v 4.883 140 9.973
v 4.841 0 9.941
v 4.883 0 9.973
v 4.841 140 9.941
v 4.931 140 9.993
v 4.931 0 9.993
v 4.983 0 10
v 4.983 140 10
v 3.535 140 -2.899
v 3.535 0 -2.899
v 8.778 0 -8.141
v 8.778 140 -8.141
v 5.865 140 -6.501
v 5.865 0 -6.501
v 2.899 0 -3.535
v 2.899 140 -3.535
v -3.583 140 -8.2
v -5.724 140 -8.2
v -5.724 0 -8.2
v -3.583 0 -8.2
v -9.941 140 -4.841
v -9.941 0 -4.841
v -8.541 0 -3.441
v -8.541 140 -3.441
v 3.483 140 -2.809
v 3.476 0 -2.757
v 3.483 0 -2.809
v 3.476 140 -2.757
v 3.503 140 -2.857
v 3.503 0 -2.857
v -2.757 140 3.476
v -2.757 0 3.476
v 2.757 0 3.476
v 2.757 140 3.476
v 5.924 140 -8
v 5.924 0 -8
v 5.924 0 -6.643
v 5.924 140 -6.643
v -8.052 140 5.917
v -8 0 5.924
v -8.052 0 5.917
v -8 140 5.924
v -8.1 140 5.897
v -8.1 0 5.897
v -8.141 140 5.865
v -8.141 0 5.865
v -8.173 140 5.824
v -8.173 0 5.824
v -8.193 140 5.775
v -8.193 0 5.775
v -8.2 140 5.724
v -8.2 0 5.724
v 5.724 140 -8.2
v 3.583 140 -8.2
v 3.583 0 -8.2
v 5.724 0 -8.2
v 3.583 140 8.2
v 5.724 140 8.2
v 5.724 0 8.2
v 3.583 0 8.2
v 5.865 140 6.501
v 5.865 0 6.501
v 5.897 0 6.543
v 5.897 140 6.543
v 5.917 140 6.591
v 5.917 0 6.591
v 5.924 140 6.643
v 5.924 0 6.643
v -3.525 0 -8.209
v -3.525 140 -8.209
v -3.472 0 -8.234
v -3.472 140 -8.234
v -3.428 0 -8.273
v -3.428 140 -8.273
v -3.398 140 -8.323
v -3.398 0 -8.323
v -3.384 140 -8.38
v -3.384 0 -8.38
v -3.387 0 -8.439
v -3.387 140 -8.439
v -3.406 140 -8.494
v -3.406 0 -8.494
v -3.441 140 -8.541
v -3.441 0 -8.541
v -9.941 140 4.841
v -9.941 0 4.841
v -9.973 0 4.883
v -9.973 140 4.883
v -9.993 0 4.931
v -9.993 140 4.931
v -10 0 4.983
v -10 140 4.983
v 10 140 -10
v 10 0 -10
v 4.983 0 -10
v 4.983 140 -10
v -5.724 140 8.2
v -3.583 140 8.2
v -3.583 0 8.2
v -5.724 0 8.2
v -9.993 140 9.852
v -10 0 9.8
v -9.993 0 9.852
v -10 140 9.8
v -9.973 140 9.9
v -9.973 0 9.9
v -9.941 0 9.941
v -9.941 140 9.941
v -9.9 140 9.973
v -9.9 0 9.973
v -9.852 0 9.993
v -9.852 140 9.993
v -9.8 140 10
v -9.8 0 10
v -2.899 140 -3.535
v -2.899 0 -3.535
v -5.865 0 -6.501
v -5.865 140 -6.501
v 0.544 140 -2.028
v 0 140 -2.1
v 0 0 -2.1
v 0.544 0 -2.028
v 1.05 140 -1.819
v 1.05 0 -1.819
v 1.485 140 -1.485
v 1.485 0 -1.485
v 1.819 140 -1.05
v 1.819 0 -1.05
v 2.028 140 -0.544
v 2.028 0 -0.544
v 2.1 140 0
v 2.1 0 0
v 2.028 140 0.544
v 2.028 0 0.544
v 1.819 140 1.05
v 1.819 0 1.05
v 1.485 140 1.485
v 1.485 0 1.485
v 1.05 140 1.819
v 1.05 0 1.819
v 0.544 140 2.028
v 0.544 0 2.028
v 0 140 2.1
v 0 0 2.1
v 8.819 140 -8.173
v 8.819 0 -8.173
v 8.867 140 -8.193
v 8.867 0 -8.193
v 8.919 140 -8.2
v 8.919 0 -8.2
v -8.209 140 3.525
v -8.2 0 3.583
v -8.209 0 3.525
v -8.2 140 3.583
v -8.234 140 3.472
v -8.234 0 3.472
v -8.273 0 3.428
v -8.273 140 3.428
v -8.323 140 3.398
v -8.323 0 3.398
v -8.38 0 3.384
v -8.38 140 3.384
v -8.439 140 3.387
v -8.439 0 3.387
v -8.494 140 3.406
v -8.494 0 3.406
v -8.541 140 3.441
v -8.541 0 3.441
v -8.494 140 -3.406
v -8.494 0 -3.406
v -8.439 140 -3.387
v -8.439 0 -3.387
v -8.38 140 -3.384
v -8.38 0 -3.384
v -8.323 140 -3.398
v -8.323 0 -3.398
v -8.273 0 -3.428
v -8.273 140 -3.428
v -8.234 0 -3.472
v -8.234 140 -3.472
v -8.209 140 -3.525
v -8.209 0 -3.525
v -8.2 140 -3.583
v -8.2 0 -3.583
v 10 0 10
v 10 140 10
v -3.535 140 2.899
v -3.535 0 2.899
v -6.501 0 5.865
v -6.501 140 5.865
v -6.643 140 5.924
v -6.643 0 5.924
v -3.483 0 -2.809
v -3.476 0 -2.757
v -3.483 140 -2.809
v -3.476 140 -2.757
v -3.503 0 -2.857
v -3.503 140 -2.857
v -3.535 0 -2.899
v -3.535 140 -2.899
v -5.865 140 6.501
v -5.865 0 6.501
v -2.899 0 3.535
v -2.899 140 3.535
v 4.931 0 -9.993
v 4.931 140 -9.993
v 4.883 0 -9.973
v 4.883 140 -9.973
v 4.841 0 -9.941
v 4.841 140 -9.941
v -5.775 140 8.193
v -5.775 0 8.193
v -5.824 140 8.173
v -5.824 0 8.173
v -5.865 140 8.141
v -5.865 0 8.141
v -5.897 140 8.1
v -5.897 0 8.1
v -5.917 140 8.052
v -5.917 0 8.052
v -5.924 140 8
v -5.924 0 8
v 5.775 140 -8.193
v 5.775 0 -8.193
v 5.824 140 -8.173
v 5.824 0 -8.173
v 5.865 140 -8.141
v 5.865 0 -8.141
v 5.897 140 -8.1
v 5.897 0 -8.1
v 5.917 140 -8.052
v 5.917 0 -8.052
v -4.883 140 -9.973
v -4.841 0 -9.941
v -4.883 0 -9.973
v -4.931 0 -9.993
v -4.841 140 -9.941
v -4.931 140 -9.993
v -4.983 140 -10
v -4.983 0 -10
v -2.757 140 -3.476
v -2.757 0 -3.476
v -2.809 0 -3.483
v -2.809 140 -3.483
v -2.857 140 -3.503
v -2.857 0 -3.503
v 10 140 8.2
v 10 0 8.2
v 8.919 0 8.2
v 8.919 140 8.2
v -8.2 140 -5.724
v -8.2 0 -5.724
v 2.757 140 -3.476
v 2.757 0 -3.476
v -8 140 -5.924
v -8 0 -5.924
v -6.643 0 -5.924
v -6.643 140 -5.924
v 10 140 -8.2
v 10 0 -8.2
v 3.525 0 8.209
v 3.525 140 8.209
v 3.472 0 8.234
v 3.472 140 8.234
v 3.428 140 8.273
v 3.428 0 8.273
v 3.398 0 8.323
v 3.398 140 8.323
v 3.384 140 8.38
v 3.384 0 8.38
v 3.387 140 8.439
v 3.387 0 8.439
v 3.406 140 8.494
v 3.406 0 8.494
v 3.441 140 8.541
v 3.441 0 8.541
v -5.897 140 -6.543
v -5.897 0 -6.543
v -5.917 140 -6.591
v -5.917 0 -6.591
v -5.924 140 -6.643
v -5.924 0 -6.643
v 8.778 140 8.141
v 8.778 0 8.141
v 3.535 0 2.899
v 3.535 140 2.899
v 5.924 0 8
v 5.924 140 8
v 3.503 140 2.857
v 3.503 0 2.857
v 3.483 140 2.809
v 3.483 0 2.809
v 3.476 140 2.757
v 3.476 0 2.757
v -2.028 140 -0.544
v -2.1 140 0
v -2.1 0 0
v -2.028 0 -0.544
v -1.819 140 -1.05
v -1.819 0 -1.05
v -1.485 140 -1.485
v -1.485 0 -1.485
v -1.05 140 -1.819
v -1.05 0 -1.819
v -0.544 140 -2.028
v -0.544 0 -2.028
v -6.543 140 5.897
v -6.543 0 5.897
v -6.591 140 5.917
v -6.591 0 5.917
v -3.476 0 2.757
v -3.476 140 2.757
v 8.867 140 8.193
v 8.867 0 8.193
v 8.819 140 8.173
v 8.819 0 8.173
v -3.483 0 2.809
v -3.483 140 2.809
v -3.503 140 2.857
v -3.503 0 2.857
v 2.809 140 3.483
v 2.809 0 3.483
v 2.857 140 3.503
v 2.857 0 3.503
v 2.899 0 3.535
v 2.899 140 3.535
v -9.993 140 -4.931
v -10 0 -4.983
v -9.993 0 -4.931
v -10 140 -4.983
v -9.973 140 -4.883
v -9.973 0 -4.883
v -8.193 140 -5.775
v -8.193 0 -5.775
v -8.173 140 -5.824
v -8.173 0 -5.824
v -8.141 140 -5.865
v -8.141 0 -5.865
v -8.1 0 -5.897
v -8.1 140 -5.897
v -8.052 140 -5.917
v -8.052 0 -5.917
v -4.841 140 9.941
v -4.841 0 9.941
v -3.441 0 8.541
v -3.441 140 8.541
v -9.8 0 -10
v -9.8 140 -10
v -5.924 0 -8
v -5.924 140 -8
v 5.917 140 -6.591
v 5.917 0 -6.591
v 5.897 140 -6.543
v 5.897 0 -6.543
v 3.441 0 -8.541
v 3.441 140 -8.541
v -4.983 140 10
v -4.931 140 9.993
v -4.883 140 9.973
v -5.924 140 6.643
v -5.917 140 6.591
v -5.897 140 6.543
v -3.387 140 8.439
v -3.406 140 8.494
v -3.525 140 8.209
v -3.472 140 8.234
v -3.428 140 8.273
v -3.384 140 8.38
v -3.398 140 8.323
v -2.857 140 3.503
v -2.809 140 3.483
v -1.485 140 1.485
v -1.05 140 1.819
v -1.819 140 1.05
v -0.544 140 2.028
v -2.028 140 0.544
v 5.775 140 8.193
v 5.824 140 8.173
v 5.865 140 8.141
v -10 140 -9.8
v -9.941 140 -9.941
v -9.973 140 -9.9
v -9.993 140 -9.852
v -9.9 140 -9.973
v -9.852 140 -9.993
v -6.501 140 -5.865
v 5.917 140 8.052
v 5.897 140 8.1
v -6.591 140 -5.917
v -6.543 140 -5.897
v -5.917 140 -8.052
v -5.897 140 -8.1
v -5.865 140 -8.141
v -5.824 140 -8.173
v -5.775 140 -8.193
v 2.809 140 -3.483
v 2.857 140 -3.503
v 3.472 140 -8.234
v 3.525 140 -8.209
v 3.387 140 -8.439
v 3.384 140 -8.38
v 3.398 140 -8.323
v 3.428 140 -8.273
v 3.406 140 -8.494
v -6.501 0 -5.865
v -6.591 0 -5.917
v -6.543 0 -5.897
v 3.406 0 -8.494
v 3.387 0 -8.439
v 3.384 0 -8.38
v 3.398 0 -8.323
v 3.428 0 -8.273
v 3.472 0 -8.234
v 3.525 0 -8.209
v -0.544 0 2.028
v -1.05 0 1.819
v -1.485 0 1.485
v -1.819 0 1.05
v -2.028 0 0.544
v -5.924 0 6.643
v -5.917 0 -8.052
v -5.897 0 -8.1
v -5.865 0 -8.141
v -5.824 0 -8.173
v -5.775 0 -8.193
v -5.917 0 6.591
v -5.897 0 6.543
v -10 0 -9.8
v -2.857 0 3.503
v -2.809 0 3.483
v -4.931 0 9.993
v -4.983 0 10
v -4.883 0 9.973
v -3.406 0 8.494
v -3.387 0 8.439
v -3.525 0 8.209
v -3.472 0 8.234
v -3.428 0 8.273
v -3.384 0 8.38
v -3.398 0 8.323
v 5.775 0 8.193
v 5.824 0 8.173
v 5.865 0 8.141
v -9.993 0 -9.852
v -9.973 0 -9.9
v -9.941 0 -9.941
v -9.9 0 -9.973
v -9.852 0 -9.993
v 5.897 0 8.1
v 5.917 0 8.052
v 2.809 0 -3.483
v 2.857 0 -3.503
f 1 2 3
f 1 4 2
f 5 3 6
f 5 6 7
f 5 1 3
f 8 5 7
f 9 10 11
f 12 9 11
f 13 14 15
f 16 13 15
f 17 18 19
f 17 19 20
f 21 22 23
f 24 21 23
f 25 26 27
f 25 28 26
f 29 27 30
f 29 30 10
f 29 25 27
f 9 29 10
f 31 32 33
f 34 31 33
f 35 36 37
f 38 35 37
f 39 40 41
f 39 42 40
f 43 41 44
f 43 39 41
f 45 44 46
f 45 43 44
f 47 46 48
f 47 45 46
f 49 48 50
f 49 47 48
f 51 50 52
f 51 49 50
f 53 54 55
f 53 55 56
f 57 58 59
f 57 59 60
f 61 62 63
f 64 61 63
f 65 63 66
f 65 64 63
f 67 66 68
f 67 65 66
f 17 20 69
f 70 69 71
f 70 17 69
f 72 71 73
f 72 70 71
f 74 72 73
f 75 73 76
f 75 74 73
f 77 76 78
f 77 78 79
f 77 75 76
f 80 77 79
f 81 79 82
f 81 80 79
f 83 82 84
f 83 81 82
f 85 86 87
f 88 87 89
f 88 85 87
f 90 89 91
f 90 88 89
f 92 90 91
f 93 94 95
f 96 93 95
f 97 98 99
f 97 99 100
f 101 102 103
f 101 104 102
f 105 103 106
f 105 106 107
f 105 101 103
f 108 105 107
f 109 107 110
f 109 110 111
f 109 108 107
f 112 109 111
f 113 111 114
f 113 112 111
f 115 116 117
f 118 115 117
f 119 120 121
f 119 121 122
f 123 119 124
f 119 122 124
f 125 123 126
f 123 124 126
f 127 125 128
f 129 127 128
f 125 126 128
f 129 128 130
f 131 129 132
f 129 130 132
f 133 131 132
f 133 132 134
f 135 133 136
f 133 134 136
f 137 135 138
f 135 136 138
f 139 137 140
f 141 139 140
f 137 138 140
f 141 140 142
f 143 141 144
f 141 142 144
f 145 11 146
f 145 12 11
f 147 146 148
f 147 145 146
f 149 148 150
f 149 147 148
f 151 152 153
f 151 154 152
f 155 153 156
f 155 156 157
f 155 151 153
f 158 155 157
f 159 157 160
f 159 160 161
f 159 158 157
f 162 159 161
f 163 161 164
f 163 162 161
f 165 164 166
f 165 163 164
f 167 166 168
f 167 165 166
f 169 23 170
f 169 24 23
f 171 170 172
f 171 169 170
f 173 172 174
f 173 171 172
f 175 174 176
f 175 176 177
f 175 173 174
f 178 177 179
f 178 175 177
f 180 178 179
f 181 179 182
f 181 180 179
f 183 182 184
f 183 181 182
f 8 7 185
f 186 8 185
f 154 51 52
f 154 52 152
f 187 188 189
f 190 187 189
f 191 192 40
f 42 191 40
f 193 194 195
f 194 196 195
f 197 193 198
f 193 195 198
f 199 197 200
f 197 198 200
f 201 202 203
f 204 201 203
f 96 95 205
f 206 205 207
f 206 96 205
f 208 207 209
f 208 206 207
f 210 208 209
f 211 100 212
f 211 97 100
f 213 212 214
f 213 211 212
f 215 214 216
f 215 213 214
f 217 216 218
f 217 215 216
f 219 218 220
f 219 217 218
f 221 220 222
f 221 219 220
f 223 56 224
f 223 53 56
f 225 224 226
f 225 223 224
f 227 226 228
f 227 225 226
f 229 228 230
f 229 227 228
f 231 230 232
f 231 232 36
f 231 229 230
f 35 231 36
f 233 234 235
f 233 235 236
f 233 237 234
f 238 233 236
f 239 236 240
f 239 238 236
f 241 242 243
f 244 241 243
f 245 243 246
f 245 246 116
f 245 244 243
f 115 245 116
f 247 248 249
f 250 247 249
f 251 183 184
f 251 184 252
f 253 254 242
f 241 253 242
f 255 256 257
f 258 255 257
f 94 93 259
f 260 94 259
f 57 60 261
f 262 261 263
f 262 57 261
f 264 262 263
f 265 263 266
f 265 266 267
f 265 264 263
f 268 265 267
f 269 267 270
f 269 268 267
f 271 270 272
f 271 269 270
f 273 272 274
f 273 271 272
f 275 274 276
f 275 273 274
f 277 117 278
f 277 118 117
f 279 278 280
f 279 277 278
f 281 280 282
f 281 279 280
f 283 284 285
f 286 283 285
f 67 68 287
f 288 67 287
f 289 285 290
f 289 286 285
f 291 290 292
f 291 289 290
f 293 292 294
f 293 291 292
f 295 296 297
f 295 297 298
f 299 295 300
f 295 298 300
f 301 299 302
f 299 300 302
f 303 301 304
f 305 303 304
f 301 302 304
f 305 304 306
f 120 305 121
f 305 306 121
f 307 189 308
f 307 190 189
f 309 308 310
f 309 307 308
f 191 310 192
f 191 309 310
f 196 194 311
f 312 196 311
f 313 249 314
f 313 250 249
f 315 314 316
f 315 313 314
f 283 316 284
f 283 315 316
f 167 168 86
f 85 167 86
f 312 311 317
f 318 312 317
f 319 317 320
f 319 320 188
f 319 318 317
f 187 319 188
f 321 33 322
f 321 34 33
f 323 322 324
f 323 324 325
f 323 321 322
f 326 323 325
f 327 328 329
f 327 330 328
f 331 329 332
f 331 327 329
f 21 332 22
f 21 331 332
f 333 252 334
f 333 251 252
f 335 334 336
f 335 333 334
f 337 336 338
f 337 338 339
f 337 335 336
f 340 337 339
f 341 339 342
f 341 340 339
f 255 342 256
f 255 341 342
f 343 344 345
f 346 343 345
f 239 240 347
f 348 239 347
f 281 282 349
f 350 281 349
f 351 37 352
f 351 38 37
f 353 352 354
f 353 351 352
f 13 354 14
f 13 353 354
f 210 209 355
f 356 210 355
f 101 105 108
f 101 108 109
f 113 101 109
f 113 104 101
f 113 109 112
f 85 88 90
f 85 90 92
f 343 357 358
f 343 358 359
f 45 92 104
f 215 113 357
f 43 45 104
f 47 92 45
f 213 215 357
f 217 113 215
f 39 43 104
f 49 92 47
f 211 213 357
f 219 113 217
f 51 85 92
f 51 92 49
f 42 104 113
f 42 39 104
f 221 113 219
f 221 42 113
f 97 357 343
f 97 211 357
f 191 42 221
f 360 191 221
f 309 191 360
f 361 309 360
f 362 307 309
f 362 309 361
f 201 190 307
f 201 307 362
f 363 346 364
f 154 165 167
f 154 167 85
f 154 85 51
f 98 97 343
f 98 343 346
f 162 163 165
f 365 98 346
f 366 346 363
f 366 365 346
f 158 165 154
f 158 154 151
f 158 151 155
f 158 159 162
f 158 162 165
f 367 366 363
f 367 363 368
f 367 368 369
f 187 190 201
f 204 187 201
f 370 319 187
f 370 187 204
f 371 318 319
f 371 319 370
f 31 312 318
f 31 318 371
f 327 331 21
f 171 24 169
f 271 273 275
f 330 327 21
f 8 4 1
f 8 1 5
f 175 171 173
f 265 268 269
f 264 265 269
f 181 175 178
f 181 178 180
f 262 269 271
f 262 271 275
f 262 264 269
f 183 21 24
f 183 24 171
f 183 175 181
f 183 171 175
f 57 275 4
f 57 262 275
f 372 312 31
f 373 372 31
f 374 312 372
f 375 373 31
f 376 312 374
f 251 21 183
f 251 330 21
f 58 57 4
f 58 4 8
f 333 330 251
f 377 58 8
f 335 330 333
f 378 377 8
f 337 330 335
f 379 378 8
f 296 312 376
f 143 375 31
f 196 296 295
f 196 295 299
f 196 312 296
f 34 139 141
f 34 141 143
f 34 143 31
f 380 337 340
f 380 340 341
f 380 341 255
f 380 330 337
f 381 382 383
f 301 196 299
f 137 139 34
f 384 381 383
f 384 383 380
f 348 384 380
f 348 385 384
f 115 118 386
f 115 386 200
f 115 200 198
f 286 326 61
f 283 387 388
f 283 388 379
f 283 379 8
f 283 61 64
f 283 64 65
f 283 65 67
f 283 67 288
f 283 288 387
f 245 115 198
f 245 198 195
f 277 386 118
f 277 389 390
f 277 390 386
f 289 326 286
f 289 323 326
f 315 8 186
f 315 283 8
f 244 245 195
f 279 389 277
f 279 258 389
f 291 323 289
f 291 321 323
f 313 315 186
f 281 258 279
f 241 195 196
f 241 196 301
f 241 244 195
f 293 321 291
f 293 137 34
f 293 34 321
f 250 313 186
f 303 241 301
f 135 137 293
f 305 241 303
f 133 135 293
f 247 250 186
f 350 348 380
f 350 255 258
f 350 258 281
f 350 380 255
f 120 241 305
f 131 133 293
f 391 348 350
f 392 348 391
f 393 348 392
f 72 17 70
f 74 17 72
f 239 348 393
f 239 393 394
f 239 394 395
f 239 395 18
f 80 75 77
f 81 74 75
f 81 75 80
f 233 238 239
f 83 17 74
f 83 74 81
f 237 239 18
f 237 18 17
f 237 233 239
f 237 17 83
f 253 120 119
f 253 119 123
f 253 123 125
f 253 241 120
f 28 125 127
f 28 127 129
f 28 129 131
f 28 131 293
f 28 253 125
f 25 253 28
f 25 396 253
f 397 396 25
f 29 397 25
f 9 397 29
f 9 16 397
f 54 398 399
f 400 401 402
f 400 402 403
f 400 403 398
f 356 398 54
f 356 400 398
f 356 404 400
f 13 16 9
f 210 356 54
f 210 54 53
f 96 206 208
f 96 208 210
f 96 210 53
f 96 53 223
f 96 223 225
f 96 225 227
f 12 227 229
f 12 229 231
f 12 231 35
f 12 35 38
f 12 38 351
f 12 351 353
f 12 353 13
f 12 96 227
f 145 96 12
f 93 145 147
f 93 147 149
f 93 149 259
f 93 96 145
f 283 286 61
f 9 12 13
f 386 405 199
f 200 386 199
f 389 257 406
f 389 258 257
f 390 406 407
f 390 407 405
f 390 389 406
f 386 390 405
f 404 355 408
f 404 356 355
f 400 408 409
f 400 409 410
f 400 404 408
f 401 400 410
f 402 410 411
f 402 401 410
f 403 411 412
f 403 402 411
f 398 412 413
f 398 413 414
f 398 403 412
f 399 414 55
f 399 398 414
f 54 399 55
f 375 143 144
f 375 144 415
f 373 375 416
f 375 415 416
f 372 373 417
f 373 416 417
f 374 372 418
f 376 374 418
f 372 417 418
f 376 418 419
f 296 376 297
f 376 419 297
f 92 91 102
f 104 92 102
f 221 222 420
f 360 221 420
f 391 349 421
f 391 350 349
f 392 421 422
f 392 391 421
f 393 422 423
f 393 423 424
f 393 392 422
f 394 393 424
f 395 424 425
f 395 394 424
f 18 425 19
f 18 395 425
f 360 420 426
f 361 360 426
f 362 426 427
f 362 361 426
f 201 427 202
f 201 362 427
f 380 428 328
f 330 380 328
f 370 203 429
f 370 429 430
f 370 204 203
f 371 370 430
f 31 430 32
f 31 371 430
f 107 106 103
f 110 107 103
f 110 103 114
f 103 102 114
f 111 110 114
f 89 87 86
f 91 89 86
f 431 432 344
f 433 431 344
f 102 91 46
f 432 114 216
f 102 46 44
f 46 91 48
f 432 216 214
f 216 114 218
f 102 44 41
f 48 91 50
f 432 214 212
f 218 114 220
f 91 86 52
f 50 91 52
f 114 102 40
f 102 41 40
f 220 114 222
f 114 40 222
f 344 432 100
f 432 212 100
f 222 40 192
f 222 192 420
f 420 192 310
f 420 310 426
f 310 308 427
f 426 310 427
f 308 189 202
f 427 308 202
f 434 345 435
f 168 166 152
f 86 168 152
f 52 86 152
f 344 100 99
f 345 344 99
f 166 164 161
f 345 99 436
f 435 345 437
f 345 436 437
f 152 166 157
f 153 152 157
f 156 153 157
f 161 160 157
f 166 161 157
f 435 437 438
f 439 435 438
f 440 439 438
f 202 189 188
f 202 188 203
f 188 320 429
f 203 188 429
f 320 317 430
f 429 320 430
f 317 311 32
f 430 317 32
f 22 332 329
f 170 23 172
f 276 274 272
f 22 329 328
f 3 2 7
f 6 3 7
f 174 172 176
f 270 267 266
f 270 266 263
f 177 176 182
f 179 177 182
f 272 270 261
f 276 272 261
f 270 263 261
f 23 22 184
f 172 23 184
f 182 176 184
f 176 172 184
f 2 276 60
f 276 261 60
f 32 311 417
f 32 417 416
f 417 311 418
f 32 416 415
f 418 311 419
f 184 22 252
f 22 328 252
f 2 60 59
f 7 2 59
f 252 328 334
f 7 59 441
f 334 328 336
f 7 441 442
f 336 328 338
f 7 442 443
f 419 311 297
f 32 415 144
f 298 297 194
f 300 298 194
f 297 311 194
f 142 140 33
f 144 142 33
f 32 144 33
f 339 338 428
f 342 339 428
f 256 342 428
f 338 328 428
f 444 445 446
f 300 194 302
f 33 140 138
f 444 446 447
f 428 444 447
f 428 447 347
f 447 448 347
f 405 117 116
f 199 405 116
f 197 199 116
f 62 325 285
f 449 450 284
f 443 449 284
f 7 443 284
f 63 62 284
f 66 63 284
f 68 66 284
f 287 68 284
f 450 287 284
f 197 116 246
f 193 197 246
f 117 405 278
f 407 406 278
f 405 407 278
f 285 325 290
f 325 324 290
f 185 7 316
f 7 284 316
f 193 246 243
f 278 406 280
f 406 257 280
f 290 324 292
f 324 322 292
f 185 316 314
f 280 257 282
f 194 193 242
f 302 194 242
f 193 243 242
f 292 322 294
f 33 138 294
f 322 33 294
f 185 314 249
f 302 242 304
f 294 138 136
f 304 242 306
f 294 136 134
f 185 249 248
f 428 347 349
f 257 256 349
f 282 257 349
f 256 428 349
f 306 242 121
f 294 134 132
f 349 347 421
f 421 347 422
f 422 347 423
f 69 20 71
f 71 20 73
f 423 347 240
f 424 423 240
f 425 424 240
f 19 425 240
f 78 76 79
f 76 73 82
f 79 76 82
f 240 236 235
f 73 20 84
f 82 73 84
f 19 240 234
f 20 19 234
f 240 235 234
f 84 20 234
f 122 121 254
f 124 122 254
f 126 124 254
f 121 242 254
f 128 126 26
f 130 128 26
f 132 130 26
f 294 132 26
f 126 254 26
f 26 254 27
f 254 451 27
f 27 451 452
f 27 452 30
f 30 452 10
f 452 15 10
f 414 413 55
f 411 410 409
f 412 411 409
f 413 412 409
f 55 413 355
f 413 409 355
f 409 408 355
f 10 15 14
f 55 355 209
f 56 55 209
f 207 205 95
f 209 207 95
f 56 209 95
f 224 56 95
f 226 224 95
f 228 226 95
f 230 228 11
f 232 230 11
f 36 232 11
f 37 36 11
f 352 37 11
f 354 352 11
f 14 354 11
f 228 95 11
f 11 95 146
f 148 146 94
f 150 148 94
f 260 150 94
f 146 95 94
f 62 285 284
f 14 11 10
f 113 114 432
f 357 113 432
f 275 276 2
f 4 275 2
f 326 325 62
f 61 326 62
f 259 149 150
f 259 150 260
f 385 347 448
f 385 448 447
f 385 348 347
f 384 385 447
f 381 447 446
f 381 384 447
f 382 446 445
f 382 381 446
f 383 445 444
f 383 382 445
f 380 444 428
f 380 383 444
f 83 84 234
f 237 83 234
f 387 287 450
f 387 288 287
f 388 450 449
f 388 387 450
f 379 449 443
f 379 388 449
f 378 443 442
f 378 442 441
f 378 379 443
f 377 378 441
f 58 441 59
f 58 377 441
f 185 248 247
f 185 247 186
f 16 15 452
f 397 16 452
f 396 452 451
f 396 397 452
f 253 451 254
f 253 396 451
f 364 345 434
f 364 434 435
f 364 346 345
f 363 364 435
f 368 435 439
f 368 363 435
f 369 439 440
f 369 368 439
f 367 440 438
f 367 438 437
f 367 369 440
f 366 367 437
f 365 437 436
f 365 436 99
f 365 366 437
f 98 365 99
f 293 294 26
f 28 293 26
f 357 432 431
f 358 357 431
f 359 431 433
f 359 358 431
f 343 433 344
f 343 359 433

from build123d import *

# Parameters (mm, degrees)
EXTRUDE_1_DEPTH          = 140
FILLET_1_R               = 0.2
CUT_EXTRUDE_1_DEPTH      = 149.996644258
CUT_EXTRUDE_1_DEPTH_BACK = 149.996644258
SKETCH_2_W               = 41.416635457
SKETCH_2_H               = 21.85529521


with BuildPart() as part:
    # 草图1 → 凸台-拉伸1 (new body)
    with BuildSketch(Plane(origin=(0, 0, 0), x_dir=(1, 0, 0), z_dir=(0, 1, 0))):
        with BuildLine():
            Line((-3.476396103, 2.84), (-3.476396103, 0))
            Line((-3.476396103, 0), (-2.1, 0))
            ThreePointArc((-2.1, 0), (-1.48492424, 1.48492424), (0, 2.1))
            Line((0, 2.1), (0, 3.476396103))
            Line((0, 3.476396103), (-2.84, 3.476396103))
            Line((-2.84, 3.476396103), (-5.923603897, 6.56))
            Line((-5.923603897, 6.56), (-5.923603897, 8.2))
            Line((-5.923603897, 8.2), (-3.1, 8.2))
            Line((-3.1, 8.2), (-4.9, 10))
            Line((-4.9, 10), (-10, 10))
            Line((-10, 10), (-10, 4.9))
            Line((-10, 4.9), (-8.2, 3.1))
            Line((-8.2, 3.1), (-8.2, 5.923603897))
            Line((-8.2, 5.923603897), (-6.56, 5.923603897))
            Line((-6.56, 5.923603897), (-3.476396103, 2.84))
        make_face()
        with BuildLine():
            Line((-2.1, 0), (-3.476396103, 0))
            Line((-3.476396103, 0), (-3.476396103, -2.84))
            Line((-3.476396103, -2.84), (-6.56, -5.923603897))
            Line((-6.56, -5.923603897), (-8.2, -5.923603897))
            Line((-8.2, -5.923603897), (-8.2, -3.1))
            Line((-8.2, -3.1), (-10, -4.9))
            Line((-10, -4.9), (-10, -10))
            Line((-10, -10), (-4.9, -10))
            Line((-4.9, -10), (-3.1, -8.2))
            Line((-3.1, -8.2), (-5.923603897, -8.2))
            Line((-5.923603897, -8.2), (-5.923603897, -6.56))
            Line((-5.923603897, -6.56), (-2.84, -3.476396103))
            Line((-2.84, -3.476396103), (0, -3.476396103))
            Line((0, -3.476396103), (0, -2.1))
            ThreePointArc((0, -2.1), (-1.48492424, -1.48492424), (-2.1, 0))
        make_face()
        with BuildLine():
            ThreePointArc((2.1, 0), (1.48492424, -1.48492424), (0, -2.1))
            Line((0, -2.1), (0, -3.476396103))
            Line((0, -3.476396103), (2.84, -3.476396103))
            Line((2.84, -3.476396103), (5.923603897, -6.56))
            Line((5.923603897, -6.56), (5.923603897, -8.2))
            Line((5.923603897, -8.2), (3.1, -8.2))
            Line((3.1, -8.2), (4.9, -10))
            Line((4.9, -10), (15.1, -10))
            Line((15.1, -10), (16.9, -8.2))
            Line((16.9, -8.2), (14.076396103, -8.2))
            Line((14.076396103, -8.2), (14.076396103, -6.56))
            Line((14.076396103, -6.56), (17.16, -3.476396103))
            Line((17.16, -3.476396103), (20, -3.476396103))
            Line((20, -3.476396103), (20, -2.1))
            ThreePointArc((20, -2.1), (18.51507576, -1.48492424), (17.9, 0))
            Line((17.9, 0), (16.523603897, 0))
            Line((16.523603897, 0), (16.523603897, -2.84))
            Line((16.523603897, -2.84), (13.44, -5.923603897))
            Line((13.44, -5.923603897), (11.163603897, -8.2))
            Line((11.163603897, -8.2), (8.836396103, -8.2))
            Line((8.836396103, -8.2), (6.56, -5.923603897))
            Line((6.56, -5.923603897), (3.476396103, -2.84))
            Line((3.476396103, -2.84), (3.476396103, 0))
            Line((3.476396103, 0), (2.1, 0))
        make_face()
        with BuildLine():
            Line((0, 3.476396103), (0, 2.1))
            ThreePointArc((0, 2.1), (1.48492424, 1.48492424), (2.1, 0))
            Line((2.1, 0), (3.476396103, 0))
            Line((3.476396103, 0), (3.476396103, 2.84))
            Line((3.476396103, 2.84), (6.56, 5.923603897))
            Line((6.56, 5.923603897), (8.836396103, 8.2))
            Line((8.836396103, 8.2), (11.163603897, 8.2))
            Line((11.163603897, 8.2), (13.44, 5.923603897))
            Line((13.44, 5.923603897), (16.523603897, 2.84))
            Line((16.523603897, 2.84), (16.523603897, 0))
            Line((16.523603897, 0), (17.9, 0))
            ThreePointArc((17.9, 0), (18.51507576, 1.48492424), (20, 2.1))
            Line((20, 2.1), (20, 3.476396103))
            Line((20, 3.476396103), (17.16, 3.476396103))
            Line((17.16, 3.476396103), (14.076396103, 6.56))
            Line((14.076396103, 6.56), (14.076396103, 8.2))
            Line((14.076396103, 8.2), (16.9, 8.2))
            Line((16.9, 8.2), (15.1, 10))
            Line((15.1, 10), (4.9, 10))
            Line((4.9, 10), (3.1, 8.2))
            Line((3.1, 8.2), (5.923603897, 8.2))
            Line((5.923603897, 8.2), (5.923603897, 6.56))
            Line((5.923603897, 6.56), (2.84, 3.476396103))
            Line((2.84, 3.476396103), (0, 3.476396103))
        make_face()
        with BuildLine():
            Line((20, 3.476396103), (20, 2.1))
            ThreePointArc((20, 2.1), (21.48492424, 1.48492424), (22.1, 0))
            Line((22.1, 0), (23.476396103, 0))
            Line((23.476396103, 0), (23.476396103, 2.84))
            Line((23.476396103, 2.84), (26.56, 5.923603897))
            Line((26.56, 5.923603897), (28.836396103, 8.2))
            Line((28.836396103, 8.2), (31.163603897, 8.2))
            Line((31.163603897, 8.2), (33.44, 5.923603897))
            Line((33.44, 5.923603897), (36.523603897, 2.84))
            Line((36.523603897, 2.84), (36.523603897, 0))
            Line((36.523603897, 0), (37.9, 0))
            ThreePointArc((37.9, 0), (40, 2.1), (42.1, 0))
            Line((42.1, 0), (43.476396103, 0))
            Line((43.476396103, 0), (43.476396103, 2.84))
            Line((43.476396103, 2.84), (46.56, 5.923603897))
            Line((46.56, 5.923603897), (48.2, 5.923603897))
            Line((48.2, 5.923603897), (48.2, 3.1))
            Line((48.2, 3.1), (50, 4.9))
            Line((50, 4.9), (50, 10))
            Line((50, 10), (44.9, 10))
            Line((44.9, 10), (43.1, 8.2))
            Line((43.1, 8.2), (45.923603897, 8.2))
            Line((45.923603897, 8.2), (45.923603897, 6.56))
            Line((45.923603897, 6.56), (42.84, 3.476396103))
            Line((42.84, 3.476396103), (37.16, 3.476396103))
            Line((37.16, 3.476396103), (34.076396103, 6.56))
            Line((34.076396103, 6.56), (34.076396103, 8.2))
            Line((34.076396103, 8.2), (36.9, 8.2))
            Line((36.9, 8.2), (35.1, 10))
            Line((35.1, 10), (24.9, 10))
            Line((24.9, 10), (23.1, 8.2))
            Line((23.1, 8.2), (25.923603897, 8.2))
            Line((25.923603897, 8.2), (25.923603897, 6.56))
            Line((25.923603897, 6.56), (22.84, 3.476396103))
            Line((22.84, 3.476396103), (20, 3.476396103))
        make_face()
        with BuildLine():
            ThreePointArc((22.1, 0), (21.48492424, -1.48492424), (20, -2.1))
            Line((20, -2.1), (20, -3.476396103))
            Line((20, -3.476396103), (22.84, -3.476396103))
            Line((22.84, -3.476396103), (25.923603897, -6.56))
            Line((25.923603897, -6.56), (25.923603897, -8.2))
            Line((25.923603897, -8.2), (23.1, -8.2))
            Line((23.1, -8.2), (24.9, -10))
            Line((24.9, -10), (35.1, -10))
            Line((35.1, -10), (36.9, -8.2))
            Line((36.9, -8.2), (34.076396103, -8.2))
            Line((34.076396103, -8.2), (34.076396103, -6.56))
            Line((34.076396103, -6.56), (37.16, -3.476396103))
            Line((37.16, -3.476396103), (42.84, -3.476396103))
            Line((42.84, -3.476396103), (45.923603897, -6.56))
            Line((45.923603897, -6.56), (45.923603897, -8.2))
            Line((45.923603897, -8.2), (43.1, -8.2))
            Line((43.1, -8.2), (44.9, -10))
            Line((44.9, -10), (50, -10))
            Line((50, -10), (50, -4.9))
            Line((50, -4.9), (48.2, -3.1))
            Line((48.2, -3.1), (48.2, -5.923603897))
            Line((48.2, -5.923603897), (46.56, -5.923603897))
            Line((46.56, -5.923603897), (43.476396103, -2.84))
            Line((43.476396103, -2.84), (43.476396103, 0))
            Line((43.476396103, 0), (42.1, 0))
            ThreePointArc((42.1, 0), (40, -2.1), (37.9, 0))
            Line((37.9, 0), (36.523603897, 0))
            Line((36.523603897, 0), (36.523603897, -2.84))
            Line((36.523603897, -2.84), (33.44, -5.923603897))
            Line((33.44, -5.923603897), (31.163603897, -8.2))
            Line((31.163603897, -8.2), (28.836396103, -8.2))
            Line((28.836396103, -8.2), (26.56, -5.923603897))
            Line((26.56, -5.923603897), (23.476396103, -2.84))
            Line((23.476396103, -2.84), (23.476396103, 0))
            Line((23.476396103, 0), (22.1, 0))
        make_face()
    extrude(amount=EXTRUDE_1_DEPTH)

    # 圆角1
    fillet_1_edges = [part.edges().sort_by_distance(p)[0] for p in [
        (8.836396103, 70, 8.2),
        (11.163603897, 70, 8.2),
        (16.523603897, 70, 2.84),
        (16.523603897, 70, -2.84),
        (11.163603897, 70, -8.2),
        (8.836396103, 70, -8.2),
        (3.476396103, 70, -2.84),
        (3.476396103, 70, 2.84),
        (28.836396103, 70, 8.2),
        (31.163603897, 70, 8.2),
        (36.523603897, 70, 2.84),
        (36.523603897, 70, -2.84),
        (31.163603897, 70, -8.2),
        (28.836396103, 70, -8.2),
        (23.476396103, 70, -2.84),
        (23.476396103, 70, 2.84),
        (46.56, 70, 5.923603897),
        (48.2, 70, 5.923603897),
        (48.2, 70, 3.1),
        (50, 70, 4.9),
        (50, 70, 10),
        (44.9, 70, 10),
        (43.1, 70, 8.2),
        (45.923603897, 70, 8.2),
        (45.923603897, 70, 6.56),
        (42.84, 70, 3.476396103),
        (37.16, 70, 3.476396103),
        (34.076396103, 70, 6.56),
        (34.076396103, 70, 8.2),
        (36.9, 70, 8.2),
        (35.1, 70, 10),
        (24.9, 70, 10),
        (23.1, 70, 8.2),
        (25.923603897, 70, 8.2),
        (25.923603897, 70, 6.56),
        (22.84, 70, 3.476396103),
        (17.16, 70, 3.476396103),
        (14.076396103, 70, 6.56),
        (14.076396103, 70, 8.2),
        (16.9, 70, 8.2),
        (15.1, 70, 10),
        (4.9, 70, 10),
        (3.1, 70, 8.2),
        (5.923603897, 70, 8.2),
        (5.923603897, 70, 6.56),
        (2.84, 70, 3.476396103),
        (-2.84, 70, 3.476396103),
        (-5.923603897, 70, 6.56),
        (-5.923603897, 70, 8.2),
        (-3.1, 70, 8.2),
        (-4.9, 70, 10),
        (-10, 70, 10),
        (-10, 70, 4.9),
        (-8.2, 70, 3.1),
        (-8.2, 70, 5.923603897),
        (-6.56, 70, 5.923603897),
        (-3.476396103, 70, 2.84),
        (-3.476396103, 70, -2.84),
        (-6.56, 70, -5.923603897),
        (-8.2, 70, -5.923603897),
        (-8.2, 70, -3.1),
        (-10, 70, -4.9),
        (-10, 70, -10),
        (-4.9, 70, -10),
        (-3.1, 70, -8.2),
        (-5.923603897, 70, -8.2),
        (-5.923603897, 70, -6.56),
        (-2.84, 70, -3.476396103),
        (2.84, 70, -3.476396103),
        (5.923603897, 70, -6.56),
        (5.923603897, 70, -8.2),
        (3.1, 70, -8.2),
        (4.9, 70, -10),
        (15.1, 70, -10),
        (16.9, 70, -8.2),
        (14.076396103, 70, -8.2),
        (14.076396103, 70, -6.56),
        (17.16, 70, -3.476396103),
        (22.84, 70, -3.476396103),
        (25.923603897, 70, -6.56),
        (25.923603897, 70, -8.2),
        (23.1, 70, -8.2),
        (24.9, 70, -10),
        (35.1, 70, -10),
        (36.9, 70, -8.2),
        (34.076396103, 70, -8.2),
        (34.076396103, 70, -6.56),
        (37.16, 70, -3.476396103),
        (42.84, 70, -3.476396103),
        (45.923603897, 70, -6.56),
        (45.923603897, 70, -8.2),
        (43.1, 70, -8.2),
        (44.9, 70, -10),
        (50, 70, -10),
        (50, 70, -4.9),
        (48.2, 70, -3.1),
        (48.2, 70, -5.923603897),
        (46.56, 70, -5.923603897),
        (43.476396103, 70, -2.84),
        (43.476396103, 70, 2.84),
    ]]
    fillet(fillet_1_edges, radius=FILLET_1_R)

    # 草图2 → 切除-拉伸1 (cut, two sides: drawn at the far end of the back side and taken through both)
    with BuildSketch(Plane.XZ.offset(-CUT_EXTRUDE_1_DEPTH_BACK)):
        with Locations((30.708317729, -0.927647605)):
            Rectangle(SKETCH_2_W, SKETCH_2_H)
    extrude(amount=CUT_EXTRUDE_1_DEPTH + CUT_EXTRUDE_1_DEPTH_BACK, mode=Mode.SUBTRACT)


solid = part.part
